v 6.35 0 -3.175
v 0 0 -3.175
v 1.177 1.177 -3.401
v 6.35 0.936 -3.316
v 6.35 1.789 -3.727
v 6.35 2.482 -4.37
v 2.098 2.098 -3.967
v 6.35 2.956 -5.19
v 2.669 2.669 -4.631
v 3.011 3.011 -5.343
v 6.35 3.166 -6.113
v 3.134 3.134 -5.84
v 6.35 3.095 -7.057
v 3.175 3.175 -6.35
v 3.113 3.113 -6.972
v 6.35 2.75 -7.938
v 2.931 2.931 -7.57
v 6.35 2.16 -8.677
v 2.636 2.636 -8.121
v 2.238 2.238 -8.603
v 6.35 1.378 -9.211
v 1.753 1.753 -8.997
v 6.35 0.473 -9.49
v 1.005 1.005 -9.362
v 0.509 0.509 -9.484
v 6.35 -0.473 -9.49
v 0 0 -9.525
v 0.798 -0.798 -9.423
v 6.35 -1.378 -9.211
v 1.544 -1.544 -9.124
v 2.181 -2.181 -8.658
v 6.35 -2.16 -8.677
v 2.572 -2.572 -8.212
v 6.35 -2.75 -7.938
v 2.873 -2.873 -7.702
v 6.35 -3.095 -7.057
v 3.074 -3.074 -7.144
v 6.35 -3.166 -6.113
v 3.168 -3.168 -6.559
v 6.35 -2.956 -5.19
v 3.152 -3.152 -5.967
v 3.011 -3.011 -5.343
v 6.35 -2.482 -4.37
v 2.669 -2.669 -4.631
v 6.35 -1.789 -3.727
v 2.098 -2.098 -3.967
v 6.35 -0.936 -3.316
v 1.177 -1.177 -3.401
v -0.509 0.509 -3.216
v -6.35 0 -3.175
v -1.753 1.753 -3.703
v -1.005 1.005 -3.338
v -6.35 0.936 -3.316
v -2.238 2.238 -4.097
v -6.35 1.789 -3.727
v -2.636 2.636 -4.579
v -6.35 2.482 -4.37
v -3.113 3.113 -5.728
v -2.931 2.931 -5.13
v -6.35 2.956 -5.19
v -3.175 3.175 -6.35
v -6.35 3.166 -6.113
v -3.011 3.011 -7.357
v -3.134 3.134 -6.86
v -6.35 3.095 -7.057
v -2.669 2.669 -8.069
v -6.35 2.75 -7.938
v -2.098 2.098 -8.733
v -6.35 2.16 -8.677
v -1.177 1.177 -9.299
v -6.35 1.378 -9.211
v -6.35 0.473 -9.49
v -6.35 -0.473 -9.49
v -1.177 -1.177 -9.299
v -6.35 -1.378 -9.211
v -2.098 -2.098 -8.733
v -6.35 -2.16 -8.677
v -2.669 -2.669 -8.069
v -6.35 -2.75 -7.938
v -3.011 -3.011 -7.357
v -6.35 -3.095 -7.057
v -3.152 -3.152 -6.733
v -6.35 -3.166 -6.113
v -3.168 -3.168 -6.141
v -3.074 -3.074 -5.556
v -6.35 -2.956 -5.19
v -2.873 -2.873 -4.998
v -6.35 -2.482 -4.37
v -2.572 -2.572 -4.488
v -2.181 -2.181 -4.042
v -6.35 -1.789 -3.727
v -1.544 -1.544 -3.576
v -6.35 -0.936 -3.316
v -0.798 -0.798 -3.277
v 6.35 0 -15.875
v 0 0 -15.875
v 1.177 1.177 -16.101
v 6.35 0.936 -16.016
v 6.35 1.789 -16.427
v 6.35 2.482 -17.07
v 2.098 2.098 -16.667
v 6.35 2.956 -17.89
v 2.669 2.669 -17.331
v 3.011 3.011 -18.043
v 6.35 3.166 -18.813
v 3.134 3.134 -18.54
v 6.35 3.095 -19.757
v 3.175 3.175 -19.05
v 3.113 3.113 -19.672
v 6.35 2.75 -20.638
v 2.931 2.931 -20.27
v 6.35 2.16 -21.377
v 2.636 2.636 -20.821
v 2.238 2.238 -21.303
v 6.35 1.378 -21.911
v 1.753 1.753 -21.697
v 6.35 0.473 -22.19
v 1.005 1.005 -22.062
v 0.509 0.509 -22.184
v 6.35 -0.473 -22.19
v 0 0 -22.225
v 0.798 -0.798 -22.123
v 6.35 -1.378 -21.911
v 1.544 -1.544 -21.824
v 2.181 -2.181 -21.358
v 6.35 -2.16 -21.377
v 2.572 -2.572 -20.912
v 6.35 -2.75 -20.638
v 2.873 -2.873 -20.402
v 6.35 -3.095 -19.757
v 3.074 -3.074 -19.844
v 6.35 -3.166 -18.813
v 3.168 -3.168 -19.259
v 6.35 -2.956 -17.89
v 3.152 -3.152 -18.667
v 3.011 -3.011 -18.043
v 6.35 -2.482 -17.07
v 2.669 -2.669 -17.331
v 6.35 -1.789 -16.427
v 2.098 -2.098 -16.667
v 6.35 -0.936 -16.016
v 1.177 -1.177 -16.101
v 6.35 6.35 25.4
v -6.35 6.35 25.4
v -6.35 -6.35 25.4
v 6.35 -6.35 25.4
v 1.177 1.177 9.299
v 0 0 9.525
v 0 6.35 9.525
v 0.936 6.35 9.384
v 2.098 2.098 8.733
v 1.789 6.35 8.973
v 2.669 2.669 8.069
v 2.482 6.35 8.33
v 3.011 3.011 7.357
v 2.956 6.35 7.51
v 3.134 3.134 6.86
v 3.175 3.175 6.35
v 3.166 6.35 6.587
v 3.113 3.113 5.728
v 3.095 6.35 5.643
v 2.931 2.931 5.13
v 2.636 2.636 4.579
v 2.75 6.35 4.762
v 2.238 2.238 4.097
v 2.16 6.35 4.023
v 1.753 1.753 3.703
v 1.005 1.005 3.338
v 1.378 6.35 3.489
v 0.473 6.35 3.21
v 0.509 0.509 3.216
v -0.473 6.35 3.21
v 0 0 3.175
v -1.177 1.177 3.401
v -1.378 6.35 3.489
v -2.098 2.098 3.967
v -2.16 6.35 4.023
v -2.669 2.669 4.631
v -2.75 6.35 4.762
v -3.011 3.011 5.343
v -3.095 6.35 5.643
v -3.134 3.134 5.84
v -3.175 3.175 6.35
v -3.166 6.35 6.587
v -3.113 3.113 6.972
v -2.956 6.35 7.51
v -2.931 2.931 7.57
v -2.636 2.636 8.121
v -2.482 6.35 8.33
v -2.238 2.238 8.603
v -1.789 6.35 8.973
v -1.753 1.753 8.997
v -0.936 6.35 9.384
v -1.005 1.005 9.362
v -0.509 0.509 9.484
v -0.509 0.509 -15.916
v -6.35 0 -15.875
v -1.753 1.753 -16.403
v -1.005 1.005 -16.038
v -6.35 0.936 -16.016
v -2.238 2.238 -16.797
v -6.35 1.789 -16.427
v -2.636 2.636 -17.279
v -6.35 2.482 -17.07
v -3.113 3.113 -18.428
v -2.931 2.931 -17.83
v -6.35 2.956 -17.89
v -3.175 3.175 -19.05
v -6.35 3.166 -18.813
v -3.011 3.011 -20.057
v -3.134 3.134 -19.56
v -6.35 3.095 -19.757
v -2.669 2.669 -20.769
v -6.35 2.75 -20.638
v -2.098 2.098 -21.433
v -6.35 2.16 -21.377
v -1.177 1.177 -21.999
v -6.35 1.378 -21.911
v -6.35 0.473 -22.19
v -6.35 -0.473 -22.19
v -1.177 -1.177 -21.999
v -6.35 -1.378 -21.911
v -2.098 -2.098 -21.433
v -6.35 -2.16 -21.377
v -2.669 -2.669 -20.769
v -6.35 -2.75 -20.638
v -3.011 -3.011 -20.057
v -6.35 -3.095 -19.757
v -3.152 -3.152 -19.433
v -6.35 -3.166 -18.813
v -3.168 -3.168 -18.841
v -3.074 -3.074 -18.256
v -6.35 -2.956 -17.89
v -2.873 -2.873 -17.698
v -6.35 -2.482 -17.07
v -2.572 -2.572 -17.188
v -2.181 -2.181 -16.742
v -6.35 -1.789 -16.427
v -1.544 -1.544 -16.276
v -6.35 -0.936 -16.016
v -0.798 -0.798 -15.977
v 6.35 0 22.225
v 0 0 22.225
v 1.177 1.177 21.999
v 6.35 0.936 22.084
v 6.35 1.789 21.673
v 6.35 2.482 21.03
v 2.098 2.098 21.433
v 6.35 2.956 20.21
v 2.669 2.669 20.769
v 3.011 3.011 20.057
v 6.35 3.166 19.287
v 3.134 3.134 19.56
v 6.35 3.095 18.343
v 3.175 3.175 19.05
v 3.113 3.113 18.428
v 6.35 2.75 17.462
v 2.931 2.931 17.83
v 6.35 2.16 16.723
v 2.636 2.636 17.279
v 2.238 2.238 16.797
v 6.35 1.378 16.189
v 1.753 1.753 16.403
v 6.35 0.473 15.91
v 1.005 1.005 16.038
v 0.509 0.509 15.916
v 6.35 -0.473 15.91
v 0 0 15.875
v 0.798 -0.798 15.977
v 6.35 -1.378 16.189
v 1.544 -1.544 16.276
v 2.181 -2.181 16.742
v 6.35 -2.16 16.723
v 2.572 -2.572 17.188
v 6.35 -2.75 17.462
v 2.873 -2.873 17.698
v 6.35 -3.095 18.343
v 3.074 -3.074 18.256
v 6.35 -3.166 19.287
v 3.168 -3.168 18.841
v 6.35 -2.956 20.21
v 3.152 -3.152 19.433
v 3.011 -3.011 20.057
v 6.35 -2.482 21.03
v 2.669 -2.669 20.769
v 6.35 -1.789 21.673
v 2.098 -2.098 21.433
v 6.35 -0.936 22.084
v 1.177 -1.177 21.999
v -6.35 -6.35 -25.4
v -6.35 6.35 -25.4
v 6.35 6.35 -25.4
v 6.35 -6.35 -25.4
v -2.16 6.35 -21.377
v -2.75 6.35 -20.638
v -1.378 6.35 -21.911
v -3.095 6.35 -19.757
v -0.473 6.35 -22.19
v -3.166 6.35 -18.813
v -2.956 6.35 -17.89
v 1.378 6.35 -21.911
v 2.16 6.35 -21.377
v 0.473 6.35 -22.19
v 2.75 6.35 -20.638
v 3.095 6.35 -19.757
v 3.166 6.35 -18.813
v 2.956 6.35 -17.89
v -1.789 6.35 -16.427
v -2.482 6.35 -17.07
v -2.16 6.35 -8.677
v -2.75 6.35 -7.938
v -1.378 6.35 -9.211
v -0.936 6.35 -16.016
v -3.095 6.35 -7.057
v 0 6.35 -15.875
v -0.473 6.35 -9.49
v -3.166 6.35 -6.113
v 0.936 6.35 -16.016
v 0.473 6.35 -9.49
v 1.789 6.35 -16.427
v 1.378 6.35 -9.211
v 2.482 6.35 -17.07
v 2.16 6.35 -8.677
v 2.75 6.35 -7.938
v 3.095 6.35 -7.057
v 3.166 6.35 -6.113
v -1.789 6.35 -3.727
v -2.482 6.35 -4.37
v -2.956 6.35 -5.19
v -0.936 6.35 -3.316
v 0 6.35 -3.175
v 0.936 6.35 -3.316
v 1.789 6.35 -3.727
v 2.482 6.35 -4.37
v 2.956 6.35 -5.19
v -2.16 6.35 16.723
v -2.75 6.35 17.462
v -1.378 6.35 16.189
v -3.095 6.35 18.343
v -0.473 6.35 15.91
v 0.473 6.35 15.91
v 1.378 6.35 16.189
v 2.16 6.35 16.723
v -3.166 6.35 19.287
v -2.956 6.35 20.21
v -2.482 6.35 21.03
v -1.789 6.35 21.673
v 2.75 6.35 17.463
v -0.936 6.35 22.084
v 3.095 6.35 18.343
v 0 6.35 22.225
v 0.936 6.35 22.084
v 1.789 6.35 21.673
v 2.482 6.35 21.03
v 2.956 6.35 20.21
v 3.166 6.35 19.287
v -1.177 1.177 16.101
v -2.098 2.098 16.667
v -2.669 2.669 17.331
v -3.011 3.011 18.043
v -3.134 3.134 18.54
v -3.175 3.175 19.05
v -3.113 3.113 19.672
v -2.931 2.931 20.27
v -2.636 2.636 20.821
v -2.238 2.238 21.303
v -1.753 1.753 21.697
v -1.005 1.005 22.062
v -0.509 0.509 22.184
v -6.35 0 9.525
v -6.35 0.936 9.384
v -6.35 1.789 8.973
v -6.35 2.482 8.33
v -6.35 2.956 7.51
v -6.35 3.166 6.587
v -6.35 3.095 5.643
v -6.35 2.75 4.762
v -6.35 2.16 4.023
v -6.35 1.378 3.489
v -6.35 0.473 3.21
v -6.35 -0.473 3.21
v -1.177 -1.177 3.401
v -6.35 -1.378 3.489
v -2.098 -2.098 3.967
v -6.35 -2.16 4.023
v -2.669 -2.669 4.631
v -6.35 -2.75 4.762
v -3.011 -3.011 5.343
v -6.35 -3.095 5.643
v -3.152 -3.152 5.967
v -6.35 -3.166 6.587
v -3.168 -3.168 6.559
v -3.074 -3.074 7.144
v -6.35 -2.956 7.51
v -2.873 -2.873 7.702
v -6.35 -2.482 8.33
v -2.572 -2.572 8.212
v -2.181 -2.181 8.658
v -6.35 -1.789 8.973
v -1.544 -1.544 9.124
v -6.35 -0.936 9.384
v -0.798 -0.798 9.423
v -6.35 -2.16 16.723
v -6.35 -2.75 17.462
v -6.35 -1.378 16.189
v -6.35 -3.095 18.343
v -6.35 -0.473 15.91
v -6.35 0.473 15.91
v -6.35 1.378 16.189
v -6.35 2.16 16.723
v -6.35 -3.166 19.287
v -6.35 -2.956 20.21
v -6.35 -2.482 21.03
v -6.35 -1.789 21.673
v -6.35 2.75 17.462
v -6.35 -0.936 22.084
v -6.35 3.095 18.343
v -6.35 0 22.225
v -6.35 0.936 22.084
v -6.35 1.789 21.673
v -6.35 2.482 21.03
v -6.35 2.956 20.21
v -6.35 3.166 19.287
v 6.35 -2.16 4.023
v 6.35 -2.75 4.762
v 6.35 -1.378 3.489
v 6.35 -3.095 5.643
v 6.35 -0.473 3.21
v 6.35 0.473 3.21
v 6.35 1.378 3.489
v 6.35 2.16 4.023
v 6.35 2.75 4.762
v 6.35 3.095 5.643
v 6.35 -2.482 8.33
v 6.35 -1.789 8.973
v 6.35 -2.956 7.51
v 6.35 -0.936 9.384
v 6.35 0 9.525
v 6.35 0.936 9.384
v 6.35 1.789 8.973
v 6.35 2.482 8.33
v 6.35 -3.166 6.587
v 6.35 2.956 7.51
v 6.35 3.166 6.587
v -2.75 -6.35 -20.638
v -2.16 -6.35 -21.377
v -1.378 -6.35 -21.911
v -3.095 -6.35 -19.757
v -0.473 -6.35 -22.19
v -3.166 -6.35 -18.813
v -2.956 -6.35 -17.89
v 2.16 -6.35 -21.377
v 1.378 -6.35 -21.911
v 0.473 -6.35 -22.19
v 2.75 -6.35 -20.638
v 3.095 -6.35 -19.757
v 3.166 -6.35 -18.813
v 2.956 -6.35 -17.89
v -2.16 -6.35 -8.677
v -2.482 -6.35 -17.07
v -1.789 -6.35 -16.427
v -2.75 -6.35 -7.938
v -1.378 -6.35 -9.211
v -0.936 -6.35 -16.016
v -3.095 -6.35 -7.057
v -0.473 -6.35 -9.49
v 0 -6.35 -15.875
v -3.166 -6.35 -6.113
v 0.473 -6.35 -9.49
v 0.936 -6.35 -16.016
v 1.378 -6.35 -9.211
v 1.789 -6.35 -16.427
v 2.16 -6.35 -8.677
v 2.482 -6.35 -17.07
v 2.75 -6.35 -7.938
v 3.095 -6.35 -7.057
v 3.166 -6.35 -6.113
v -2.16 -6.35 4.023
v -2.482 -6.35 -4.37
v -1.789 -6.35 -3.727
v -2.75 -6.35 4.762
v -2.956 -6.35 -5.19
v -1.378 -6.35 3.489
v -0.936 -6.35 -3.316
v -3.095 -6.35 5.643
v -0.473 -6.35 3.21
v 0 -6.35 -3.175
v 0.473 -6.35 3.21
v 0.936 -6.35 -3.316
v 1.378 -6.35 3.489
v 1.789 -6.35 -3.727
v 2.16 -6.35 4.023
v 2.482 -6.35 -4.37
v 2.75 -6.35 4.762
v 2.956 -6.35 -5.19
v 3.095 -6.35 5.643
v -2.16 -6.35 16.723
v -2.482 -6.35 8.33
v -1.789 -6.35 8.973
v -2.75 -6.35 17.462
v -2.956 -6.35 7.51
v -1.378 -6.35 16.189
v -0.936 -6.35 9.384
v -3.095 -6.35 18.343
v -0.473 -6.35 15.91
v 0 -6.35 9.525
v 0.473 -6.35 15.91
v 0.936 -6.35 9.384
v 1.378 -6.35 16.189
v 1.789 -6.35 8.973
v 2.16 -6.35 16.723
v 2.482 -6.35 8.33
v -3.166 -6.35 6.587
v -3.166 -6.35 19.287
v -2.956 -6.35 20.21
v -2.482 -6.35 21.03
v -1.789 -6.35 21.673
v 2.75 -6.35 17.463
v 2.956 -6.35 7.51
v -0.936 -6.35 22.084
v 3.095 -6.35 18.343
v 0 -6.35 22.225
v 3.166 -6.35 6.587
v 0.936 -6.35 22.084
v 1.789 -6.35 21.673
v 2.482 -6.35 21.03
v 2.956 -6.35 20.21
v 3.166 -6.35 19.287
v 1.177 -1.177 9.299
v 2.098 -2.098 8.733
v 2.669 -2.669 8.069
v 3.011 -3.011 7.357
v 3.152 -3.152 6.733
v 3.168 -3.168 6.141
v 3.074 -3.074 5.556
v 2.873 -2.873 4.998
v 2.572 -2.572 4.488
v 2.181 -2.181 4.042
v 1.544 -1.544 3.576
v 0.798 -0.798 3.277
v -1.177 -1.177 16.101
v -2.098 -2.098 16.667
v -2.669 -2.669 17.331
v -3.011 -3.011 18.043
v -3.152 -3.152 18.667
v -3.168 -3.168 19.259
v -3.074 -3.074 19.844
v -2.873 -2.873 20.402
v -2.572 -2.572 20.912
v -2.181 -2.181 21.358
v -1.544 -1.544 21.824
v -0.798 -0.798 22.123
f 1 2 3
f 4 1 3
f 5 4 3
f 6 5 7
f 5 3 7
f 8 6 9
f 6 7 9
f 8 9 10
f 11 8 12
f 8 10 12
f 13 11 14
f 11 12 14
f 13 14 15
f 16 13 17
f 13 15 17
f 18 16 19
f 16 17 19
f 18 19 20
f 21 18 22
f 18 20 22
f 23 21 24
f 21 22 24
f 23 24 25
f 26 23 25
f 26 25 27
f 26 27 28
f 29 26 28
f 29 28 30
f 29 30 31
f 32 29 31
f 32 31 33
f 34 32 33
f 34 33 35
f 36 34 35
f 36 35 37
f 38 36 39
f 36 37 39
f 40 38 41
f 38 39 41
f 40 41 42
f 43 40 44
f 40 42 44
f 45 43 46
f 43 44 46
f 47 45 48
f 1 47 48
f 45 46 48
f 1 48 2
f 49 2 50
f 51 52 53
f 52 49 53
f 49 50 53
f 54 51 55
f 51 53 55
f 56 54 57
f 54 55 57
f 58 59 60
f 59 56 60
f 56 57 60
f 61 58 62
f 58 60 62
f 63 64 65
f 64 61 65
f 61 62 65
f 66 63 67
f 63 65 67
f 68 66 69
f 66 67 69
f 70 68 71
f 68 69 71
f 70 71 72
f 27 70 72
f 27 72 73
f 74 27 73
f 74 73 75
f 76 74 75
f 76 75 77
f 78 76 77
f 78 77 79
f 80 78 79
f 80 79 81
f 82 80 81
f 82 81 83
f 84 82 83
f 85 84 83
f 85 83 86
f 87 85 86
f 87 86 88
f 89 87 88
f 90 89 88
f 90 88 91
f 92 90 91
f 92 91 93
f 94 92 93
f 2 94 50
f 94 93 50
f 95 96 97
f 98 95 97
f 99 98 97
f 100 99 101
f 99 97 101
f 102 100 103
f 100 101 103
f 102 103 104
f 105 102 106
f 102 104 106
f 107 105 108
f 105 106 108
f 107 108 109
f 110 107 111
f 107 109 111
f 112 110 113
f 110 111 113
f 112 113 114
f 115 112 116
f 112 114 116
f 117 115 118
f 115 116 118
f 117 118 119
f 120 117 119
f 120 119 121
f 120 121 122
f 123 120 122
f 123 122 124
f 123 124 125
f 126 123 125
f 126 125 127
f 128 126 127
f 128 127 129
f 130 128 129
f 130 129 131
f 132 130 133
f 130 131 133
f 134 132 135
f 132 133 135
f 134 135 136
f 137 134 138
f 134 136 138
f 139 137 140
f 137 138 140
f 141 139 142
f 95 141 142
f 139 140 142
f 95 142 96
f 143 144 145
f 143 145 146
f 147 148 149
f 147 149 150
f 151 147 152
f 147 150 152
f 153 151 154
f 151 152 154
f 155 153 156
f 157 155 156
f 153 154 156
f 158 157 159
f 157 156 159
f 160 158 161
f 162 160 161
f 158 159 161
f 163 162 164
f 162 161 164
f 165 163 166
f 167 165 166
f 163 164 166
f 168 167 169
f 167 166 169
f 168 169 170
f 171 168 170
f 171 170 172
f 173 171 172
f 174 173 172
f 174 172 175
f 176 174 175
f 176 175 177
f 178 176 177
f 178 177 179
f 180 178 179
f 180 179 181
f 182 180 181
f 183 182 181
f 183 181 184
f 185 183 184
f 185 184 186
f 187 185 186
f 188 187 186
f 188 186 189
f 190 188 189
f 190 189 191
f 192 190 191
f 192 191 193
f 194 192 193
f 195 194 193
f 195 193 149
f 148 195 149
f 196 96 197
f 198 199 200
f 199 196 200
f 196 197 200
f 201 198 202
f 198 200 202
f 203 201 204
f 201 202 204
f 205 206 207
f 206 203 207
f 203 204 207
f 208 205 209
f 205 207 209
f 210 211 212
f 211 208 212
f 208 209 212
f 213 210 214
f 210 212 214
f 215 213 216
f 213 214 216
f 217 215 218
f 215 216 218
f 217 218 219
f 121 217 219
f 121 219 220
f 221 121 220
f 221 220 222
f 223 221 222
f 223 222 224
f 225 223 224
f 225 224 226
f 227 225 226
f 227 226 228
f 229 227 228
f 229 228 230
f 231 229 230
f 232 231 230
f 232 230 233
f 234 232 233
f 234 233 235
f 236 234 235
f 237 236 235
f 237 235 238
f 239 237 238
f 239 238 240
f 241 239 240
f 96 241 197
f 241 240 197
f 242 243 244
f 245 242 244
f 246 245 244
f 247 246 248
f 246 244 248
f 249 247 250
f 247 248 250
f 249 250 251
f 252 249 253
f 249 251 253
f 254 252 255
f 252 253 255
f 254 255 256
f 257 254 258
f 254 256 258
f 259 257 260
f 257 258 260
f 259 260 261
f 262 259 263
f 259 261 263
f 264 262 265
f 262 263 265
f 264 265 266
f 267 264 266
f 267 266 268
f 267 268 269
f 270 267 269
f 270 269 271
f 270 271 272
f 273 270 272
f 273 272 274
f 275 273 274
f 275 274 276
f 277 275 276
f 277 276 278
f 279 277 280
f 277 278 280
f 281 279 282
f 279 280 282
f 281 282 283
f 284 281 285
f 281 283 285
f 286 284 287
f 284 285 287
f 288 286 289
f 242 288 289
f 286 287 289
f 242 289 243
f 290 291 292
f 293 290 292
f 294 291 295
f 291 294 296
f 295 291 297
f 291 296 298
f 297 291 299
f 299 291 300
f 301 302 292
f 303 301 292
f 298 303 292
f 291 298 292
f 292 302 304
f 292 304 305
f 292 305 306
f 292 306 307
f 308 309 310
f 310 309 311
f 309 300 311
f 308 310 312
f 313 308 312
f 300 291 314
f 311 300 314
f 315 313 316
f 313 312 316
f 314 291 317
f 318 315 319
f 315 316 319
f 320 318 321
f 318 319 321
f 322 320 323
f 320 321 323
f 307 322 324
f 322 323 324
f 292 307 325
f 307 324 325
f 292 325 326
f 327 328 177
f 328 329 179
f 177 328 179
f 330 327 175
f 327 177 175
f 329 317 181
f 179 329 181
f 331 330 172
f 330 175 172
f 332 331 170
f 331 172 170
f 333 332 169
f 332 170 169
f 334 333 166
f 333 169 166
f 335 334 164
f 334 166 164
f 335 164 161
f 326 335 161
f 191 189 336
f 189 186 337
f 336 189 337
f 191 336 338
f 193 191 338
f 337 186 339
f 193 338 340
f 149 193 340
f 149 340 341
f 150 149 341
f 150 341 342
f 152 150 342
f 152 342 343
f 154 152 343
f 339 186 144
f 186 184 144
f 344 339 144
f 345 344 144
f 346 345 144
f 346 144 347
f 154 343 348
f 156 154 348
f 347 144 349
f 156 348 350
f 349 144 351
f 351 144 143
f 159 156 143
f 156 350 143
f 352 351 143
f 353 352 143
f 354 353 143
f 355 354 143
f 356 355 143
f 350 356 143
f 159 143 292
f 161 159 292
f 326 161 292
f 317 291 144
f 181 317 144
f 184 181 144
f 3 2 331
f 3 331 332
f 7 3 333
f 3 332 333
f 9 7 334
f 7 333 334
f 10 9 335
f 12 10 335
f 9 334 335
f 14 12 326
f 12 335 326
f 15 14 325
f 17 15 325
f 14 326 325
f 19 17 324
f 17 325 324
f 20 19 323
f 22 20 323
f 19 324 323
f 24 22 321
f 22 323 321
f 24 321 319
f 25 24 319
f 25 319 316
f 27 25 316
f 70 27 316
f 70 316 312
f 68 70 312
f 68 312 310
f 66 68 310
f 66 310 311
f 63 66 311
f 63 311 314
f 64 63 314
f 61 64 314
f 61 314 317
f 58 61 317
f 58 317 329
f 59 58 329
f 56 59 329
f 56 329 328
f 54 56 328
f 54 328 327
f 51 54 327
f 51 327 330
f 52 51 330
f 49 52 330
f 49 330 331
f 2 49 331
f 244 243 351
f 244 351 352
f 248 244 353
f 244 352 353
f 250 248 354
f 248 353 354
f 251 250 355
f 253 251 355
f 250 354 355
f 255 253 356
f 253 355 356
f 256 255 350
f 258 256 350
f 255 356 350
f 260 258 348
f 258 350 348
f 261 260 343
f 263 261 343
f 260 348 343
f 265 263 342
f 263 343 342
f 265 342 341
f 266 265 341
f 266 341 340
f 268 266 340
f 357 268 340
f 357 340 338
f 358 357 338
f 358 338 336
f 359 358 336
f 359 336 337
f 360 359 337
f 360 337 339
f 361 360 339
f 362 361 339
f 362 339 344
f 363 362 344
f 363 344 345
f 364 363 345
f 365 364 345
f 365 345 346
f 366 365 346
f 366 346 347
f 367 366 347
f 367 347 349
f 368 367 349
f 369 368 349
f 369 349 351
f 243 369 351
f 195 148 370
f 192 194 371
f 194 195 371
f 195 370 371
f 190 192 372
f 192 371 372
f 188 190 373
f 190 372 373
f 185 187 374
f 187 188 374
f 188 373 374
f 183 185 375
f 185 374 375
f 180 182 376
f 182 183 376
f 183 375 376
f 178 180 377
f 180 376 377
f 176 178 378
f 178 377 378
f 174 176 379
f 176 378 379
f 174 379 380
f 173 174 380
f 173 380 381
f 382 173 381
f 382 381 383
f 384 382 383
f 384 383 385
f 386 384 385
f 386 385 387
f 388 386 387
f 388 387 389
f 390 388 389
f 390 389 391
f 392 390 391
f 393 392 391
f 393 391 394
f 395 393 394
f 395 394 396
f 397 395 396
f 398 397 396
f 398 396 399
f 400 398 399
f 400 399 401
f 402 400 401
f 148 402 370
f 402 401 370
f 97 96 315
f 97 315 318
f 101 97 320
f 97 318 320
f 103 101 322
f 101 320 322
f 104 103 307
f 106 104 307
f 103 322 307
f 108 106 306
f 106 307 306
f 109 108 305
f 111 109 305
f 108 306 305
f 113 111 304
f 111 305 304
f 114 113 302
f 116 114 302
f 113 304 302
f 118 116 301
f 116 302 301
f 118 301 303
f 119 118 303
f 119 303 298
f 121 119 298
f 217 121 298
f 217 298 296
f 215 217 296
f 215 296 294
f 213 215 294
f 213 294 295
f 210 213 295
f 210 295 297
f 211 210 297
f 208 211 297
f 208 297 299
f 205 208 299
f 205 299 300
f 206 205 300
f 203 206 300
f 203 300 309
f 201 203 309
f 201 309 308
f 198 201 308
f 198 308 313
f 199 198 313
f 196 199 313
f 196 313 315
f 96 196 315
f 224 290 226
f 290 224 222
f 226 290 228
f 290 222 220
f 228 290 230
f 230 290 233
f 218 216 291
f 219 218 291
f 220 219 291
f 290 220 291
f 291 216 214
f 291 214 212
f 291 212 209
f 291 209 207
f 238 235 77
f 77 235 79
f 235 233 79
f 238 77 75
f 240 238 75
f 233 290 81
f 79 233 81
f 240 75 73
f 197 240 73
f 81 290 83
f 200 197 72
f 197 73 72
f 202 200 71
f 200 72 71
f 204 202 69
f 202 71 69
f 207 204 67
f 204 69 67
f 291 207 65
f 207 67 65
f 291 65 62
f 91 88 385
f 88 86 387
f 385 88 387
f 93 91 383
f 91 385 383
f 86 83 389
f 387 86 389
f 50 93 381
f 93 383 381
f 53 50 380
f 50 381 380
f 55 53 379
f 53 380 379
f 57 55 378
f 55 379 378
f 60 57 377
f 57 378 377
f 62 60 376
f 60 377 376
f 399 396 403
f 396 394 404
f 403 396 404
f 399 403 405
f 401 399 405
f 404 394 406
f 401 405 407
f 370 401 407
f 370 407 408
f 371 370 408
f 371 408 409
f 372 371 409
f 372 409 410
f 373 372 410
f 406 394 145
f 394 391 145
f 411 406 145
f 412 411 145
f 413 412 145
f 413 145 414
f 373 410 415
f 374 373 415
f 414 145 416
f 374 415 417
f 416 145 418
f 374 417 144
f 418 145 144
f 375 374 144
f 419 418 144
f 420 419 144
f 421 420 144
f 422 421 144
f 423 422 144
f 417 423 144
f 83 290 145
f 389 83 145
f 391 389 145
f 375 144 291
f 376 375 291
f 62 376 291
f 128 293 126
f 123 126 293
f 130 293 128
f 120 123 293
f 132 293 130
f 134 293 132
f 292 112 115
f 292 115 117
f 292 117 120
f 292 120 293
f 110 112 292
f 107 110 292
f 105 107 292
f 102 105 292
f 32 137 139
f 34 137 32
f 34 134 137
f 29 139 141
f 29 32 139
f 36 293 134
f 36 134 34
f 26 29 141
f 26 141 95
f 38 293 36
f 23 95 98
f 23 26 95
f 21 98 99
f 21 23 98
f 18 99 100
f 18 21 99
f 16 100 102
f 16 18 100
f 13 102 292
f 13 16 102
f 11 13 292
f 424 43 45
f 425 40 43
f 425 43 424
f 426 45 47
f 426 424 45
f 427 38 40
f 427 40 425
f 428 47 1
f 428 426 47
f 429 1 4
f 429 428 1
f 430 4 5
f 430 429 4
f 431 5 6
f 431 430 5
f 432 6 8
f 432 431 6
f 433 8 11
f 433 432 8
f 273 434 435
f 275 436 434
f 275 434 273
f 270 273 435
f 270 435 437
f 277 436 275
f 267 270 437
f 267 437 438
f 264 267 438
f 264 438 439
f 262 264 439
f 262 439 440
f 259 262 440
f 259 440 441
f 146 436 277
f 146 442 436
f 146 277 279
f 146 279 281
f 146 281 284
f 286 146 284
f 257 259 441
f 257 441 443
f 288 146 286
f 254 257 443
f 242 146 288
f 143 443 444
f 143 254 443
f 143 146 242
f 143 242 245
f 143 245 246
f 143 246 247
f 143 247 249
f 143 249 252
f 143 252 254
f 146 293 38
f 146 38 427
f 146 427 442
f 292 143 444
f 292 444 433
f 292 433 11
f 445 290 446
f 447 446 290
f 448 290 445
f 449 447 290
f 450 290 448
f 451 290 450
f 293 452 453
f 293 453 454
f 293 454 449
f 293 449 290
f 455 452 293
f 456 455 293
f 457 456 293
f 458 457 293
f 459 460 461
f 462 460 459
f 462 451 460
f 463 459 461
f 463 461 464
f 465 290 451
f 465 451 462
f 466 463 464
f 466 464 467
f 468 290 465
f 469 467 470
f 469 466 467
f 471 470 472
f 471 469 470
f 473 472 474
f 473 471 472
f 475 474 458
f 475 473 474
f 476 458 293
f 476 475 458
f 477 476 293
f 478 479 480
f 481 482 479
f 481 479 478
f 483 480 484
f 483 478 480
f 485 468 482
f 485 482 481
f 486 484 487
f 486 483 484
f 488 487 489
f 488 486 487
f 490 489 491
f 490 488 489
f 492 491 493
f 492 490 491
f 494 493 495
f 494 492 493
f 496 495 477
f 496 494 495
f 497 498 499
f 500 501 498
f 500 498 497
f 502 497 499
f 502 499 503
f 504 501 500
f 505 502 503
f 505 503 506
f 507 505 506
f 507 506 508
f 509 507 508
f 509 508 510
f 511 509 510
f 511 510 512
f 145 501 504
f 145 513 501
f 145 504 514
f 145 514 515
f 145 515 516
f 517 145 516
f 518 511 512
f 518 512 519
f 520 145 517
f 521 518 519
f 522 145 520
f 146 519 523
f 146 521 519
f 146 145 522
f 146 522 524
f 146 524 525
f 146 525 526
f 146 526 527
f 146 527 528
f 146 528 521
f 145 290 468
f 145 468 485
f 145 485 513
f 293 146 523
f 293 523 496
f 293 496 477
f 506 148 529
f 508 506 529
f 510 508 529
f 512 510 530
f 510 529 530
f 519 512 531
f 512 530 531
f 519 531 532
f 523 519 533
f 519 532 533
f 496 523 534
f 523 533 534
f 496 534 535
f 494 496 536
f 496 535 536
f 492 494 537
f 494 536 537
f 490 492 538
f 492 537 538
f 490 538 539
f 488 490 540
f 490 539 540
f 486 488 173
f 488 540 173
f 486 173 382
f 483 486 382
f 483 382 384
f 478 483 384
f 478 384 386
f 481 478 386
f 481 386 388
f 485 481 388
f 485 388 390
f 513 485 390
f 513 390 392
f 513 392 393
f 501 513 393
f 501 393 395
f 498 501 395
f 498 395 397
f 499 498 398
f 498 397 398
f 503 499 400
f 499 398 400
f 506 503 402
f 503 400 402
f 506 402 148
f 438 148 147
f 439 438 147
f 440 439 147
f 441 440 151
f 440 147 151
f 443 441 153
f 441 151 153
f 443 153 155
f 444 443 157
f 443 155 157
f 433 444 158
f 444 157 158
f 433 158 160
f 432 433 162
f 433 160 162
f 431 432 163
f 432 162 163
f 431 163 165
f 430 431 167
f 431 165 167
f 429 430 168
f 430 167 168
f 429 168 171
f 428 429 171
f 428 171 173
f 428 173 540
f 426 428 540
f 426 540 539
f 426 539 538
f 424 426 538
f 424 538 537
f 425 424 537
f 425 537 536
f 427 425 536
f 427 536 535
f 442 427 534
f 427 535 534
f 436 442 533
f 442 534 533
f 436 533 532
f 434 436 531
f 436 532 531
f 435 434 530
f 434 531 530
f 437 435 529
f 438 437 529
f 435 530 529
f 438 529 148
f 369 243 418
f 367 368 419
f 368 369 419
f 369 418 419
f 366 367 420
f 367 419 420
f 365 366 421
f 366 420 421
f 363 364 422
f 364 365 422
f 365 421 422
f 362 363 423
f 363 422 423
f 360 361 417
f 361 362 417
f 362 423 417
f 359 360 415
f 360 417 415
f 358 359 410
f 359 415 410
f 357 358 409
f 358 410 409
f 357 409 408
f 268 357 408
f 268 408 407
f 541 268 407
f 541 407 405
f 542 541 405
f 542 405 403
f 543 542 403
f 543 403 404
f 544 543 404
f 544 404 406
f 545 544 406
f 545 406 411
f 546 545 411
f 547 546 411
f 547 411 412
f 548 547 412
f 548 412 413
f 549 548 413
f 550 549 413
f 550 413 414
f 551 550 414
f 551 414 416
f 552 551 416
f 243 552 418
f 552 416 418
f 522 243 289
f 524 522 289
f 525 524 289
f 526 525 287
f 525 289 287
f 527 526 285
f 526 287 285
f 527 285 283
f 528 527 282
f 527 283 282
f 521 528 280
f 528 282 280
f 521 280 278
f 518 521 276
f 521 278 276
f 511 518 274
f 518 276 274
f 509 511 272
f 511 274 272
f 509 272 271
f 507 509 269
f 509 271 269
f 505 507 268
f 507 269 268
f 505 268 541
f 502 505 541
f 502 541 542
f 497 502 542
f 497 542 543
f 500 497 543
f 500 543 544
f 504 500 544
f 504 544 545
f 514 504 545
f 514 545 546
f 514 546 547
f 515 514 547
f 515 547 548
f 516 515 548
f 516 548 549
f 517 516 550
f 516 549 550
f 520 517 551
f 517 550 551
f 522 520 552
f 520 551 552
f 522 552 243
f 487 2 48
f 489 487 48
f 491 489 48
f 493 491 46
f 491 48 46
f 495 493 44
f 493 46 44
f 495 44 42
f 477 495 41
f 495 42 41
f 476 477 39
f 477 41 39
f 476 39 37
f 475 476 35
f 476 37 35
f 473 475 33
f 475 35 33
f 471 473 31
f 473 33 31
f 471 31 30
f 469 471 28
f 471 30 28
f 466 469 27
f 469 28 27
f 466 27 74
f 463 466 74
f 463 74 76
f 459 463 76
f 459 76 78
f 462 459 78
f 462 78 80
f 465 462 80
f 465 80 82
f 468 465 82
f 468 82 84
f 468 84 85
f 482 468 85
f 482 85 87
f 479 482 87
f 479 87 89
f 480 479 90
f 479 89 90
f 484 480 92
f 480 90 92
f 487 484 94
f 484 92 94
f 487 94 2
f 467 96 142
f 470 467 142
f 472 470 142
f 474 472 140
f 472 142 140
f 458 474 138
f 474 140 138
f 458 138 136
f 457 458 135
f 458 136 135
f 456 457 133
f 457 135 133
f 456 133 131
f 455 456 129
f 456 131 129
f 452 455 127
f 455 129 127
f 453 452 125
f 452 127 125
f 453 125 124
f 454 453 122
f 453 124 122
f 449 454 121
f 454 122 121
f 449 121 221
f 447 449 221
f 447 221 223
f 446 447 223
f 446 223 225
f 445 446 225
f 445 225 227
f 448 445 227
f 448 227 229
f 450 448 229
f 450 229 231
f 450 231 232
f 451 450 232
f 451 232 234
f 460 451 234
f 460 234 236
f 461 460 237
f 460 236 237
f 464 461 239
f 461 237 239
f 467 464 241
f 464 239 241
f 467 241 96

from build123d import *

# Parameters (mm, degrees)
SKETCH1_W           = 12.7
SKETCH1_H           = 12.7
BOSS_EXTRUDE1_DEPTH = 25.4
SKETCH2_R           = 3.175
CUT_EXTRUDE1_DEPTH  = 30.099355663
SKETCH4_R           = 3.175
CUT_EXTRUDE2_DEPTH  = 30.099355663


with BuildPart() as part:
    # Sketch1 → Boss-Extrude1 (new, symmetric)
    with BuildSketch(Plane.XY):
        Rectangle(SKETCH1_W, SKETCH1_H)
    extrude(amount=BOSS_EXTRUDE1_DEPTH, both=True)

    # Sketch2 → Cut-Extrude1 (cut, through all)
    with BuildSketch(Plane(origin=(0, 6.35, 0), x_dir=(1, 0, 0), z_dir=(0, 1, 0))):
        with Locations(Location((0, 19.05, 0), (0, 0, 270))):
            Circle(SKETCH2_R)
        with Locations(Location((0, 6.35, 0), (0, 0, 270))):
            Circle(SKETCH2_R)
        with Locations(Location((0, -6.35, 0), (0, 0, 270))):
            Circle(SKETCH2_R)
        with Locations(Location((0, -19.05, 0), (0, 0, 270))):
            Circle(SKETCH2_R)
        with Locations((0, -31.75)):
            Circle(SKETCH2_R)
        with Locations((0, -44.45)):
            Circle(SKETCH2_R)
    extrude(amount=-CUT_EXTRUDE1_DEPTH, mode=Mode.SUBTRACT)

    # Sketch4 → Cut-Extrude2 (cut, through all)
    with BuildSketch(Plane.ZY.offset(6.35)):
        with Locations((19.05, 0)):
            Circle(SKETCH4_R)
        with Locations((6.35, 0)):
            Circle(SKETCH4_R)
        with Locations((-6.35, 0)):
            Circle(SKETCH4_R)
        with Locations((-19.05, 0)):
            Circle(SKETCH4_R)
        with Locations((-31.75, 0)):
            Circle(SKETCH4_R)
        with Locations((-44.45, 0)):
            Circle(SKETCH4_R)
    extrude(amount=-CUT_EXTRUDE2_DEPTH, mode=Mode.SUBTRACT)


solid = part.part
